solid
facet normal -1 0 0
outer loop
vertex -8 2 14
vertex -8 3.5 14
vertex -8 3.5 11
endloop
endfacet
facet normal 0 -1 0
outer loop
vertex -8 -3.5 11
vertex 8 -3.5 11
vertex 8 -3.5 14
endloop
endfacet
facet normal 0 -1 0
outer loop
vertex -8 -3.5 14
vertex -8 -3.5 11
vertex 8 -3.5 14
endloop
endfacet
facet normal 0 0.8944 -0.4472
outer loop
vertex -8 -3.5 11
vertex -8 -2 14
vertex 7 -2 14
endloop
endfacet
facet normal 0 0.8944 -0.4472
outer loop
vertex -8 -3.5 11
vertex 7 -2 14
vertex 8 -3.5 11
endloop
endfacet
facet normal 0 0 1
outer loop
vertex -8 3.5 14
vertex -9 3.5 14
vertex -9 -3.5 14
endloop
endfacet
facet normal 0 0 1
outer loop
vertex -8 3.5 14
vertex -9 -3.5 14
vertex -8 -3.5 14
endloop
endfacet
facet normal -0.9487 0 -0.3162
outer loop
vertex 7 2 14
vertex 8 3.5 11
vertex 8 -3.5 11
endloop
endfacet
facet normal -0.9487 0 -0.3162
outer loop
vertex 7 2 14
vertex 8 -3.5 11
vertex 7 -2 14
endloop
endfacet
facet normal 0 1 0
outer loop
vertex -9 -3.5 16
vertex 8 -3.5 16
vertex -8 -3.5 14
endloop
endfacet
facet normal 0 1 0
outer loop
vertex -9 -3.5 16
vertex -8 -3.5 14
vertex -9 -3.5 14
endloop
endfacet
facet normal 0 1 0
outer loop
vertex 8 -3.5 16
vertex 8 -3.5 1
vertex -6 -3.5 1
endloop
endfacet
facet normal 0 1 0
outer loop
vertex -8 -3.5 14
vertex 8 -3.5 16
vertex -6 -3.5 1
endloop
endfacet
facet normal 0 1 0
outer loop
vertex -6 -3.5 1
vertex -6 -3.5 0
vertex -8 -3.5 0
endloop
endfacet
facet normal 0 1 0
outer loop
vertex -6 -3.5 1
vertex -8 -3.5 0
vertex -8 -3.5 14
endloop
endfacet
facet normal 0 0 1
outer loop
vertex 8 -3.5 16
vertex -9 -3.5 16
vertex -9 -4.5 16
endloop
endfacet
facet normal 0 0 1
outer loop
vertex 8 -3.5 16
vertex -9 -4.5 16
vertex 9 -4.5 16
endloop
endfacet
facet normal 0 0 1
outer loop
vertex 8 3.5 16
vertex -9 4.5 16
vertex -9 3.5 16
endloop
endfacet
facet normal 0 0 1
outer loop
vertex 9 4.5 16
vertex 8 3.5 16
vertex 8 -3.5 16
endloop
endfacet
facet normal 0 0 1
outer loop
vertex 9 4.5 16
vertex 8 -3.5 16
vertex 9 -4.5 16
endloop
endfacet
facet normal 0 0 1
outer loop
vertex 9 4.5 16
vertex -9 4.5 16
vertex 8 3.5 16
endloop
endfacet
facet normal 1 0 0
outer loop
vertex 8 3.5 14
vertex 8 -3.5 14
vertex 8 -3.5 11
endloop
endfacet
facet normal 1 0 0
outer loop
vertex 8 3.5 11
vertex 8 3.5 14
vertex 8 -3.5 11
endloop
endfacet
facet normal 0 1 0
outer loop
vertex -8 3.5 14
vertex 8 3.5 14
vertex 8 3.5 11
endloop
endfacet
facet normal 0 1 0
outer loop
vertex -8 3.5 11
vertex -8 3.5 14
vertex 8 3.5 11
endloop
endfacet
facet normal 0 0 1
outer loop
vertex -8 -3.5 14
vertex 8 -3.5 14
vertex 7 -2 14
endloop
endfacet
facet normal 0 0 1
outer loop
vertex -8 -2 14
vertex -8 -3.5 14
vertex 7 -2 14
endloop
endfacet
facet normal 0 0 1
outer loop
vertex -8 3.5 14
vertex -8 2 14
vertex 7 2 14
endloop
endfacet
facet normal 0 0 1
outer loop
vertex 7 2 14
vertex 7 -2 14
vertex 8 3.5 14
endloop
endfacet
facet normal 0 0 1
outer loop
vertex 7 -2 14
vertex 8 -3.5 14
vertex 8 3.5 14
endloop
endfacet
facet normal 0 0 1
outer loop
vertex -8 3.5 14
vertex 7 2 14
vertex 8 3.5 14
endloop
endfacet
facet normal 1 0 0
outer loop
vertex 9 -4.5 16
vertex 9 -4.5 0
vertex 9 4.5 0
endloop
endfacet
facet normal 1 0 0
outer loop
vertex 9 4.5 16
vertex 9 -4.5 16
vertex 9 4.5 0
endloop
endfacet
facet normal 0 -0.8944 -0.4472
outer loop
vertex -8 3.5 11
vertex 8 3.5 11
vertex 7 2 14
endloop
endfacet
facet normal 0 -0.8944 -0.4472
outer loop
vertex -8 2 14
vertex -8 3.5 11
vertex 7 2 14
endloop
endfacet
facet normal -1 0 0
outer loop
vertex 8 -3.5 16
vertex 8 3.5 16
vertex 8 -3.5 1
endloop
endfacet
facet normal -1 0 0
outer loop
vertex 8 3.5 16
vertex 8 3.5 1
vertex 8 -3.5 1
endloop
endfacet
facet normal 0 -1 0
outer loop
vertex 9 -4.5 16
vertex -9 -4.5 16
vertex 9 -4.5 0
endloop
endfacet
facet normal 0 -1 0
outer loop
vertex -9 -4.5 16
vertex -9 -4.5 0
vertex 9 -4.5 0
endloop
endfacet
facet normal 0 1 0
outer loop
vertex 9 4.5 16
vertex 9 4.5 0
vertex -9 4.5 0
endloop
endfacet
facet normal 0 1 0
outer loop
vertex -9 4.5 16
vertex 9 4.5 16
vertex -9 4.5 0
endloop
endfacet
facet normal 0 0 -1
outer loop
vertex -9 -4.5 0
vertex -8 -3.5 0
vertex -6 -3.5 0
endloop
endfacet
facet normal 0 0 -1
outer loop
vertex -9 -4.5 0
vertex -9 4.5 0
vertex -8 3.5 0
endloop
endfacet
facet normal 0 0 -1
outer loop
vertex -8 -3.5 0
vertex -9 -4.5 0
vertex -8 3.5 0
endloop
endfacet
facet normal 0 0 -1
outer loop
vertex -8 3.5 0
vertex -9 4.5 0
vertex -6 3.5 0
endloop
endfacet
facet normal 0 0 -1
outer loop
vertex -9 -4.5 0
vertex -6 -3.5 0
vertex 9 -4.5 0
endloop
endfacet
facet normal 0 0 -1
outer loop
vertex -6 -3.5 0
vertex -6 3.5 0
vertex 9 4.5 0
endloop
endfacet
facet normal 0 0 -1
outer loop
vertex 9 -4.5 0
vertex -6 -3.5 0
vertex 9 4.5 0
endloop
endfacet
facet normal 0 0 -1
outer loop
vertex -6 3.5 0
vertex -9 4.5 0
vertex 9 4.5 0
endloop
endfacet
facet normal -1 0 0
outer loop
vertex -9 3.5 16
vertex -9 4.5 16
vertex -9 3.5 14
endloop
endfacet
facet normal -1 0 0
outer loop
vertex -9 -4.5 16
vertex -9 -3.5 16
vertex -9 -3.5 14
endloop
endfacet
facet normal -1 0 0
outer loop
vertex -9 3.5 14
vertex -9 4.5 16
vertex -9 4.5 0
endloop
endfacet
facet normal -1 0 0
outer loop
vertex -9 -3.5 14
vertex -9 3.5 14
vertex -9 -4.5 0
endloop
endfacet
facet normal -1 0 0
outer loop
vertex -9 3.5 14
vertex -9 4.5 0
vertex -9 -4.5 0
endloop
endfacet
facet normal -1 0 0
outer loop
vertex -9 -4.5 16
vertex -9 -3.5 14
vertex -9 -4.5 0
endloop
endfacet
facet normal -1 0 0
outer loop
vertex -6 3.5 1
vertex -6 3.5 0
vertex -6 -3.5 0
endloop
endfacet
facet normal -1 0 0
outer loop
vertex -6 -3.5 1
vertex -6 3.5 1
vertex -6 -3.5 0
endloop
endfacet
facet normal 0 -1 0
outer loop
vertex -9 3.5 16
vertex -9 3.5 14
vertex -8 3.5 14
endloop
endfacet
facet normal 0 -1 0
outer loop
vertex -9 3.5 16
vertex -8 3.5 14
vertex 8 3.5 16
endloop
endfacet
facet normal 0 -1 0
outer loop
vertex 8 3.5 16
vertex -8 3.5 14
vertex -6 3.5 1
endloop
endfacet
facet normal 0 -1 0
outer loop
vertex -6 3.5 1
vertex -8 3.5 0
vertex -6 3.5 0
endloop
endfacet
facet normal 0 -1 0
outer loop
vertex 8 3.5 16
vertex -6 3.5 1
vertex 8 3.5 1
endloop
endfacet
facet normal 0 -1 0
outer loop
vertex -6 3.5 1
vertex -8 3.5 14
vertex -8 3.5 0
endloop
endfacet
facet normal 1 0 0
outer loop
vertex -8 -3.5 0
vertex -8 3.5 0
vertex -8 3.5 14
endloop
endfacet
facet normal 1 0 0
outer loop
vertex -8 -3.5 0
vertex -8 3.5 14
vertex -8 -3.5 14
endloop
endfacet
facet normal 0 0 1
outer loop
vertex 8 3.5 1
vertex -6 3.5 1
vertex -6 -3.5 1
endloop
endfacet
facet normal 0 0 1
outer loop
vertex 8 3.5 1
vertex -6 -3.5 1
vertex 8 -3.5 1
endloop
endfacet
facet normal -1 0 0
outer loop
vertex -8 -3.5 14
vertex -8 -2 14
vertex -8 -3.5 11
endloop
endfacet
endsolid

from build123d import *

# Parameters (mm, degrees)
F0_W      = 18
F0_H      = 9
F1_DEPTH  = 14
F2_W      = 16
F2_H      = 7
F3_DEPTH  = 13
F4_W      = 2
F4_H      = 7
F5_DEPTH  = 6
F6_DEPTH  = 9
F8_DEPTH  = 2
F10_DEPTH = 7
F12_DEPTH = 16


with BuildPart() as f1:
    # F0 (on Top) → F1 (new body)
    with BuildSketch(Plane.XY):
        Rectangle(F0_W, F0_H)
    extrude(amount=F1_DEPTH)

    # F2 (on face) → F3 (cut)
    with BuildSketch(Plane.XY.offset(14)):
        Rectangle(F2_W, F2_H)
    extrude(amount=-F3_DEPTH, mode=Mode.SUBTRACT)

    # F4 (on face) → F5 (cut)
    with BuildSketch(Plane(origin=(0, 0, 0), x_dir=(1, 0, 0), z_dir=(0, 0, -1))):
        with Locations((-7, 0)):
            Rectangle(F4_W, F4_H)
    extrude(amount=-F5_DEPTH, mode=Mode.SUBTRACT)

    # F4 (on face) → F6 (cut)
    with BuildSketch(Plane(origin=(0, 0, 0), x_dir=(1, 0, 0), z_dir=(0, 0, -1))):
        with Locations((-7, 0)):
            Rectangle(F4_W, F4_H)
    extrude(amount=-F6_DEPTH, mode=Mode.SUBTRACT)

    # F7 (on face) → F8 (join)
    with BuildSketch(Plane.XY.offset(14)):
        Polygon((9, 4.5), (-9, 4.5), (-9, 3.5), (8, 3.5), (8, -3.5), (-9, -3.5), (-9, -4.5), (9, -4.5), align=None)
    extrude(amount=F8_DEPTH)


with BuildPart() as f10:
    # F9 (on face) → F10 (new body)
    with BuildSketch(Plane(origin=(0, -3.5, 0), x_dir=(-1, 0, 0), z_dir=(0, 1, 0))):
        Polygon((-7, 14), (-8, 14), (-8, 11), align=None)
    extrude(amount=F10_DEPTH)

    # F11 (on face) → F12 (join)
    with BuildSketch(Plane(origin=(8, 0, 0), x_dir=(0, -1, 0), z_dir=(-1, 0, 0))):
        Polygon((3.5, 11), (3.5, 14), (2, 14), align=None)
        Polygon((-3.5, 11), (-2, 14), (-3.5, 14), align=None)
    extrude(amount=F12_DEPTH)


solid = Compound([f1.part, f10.part])
